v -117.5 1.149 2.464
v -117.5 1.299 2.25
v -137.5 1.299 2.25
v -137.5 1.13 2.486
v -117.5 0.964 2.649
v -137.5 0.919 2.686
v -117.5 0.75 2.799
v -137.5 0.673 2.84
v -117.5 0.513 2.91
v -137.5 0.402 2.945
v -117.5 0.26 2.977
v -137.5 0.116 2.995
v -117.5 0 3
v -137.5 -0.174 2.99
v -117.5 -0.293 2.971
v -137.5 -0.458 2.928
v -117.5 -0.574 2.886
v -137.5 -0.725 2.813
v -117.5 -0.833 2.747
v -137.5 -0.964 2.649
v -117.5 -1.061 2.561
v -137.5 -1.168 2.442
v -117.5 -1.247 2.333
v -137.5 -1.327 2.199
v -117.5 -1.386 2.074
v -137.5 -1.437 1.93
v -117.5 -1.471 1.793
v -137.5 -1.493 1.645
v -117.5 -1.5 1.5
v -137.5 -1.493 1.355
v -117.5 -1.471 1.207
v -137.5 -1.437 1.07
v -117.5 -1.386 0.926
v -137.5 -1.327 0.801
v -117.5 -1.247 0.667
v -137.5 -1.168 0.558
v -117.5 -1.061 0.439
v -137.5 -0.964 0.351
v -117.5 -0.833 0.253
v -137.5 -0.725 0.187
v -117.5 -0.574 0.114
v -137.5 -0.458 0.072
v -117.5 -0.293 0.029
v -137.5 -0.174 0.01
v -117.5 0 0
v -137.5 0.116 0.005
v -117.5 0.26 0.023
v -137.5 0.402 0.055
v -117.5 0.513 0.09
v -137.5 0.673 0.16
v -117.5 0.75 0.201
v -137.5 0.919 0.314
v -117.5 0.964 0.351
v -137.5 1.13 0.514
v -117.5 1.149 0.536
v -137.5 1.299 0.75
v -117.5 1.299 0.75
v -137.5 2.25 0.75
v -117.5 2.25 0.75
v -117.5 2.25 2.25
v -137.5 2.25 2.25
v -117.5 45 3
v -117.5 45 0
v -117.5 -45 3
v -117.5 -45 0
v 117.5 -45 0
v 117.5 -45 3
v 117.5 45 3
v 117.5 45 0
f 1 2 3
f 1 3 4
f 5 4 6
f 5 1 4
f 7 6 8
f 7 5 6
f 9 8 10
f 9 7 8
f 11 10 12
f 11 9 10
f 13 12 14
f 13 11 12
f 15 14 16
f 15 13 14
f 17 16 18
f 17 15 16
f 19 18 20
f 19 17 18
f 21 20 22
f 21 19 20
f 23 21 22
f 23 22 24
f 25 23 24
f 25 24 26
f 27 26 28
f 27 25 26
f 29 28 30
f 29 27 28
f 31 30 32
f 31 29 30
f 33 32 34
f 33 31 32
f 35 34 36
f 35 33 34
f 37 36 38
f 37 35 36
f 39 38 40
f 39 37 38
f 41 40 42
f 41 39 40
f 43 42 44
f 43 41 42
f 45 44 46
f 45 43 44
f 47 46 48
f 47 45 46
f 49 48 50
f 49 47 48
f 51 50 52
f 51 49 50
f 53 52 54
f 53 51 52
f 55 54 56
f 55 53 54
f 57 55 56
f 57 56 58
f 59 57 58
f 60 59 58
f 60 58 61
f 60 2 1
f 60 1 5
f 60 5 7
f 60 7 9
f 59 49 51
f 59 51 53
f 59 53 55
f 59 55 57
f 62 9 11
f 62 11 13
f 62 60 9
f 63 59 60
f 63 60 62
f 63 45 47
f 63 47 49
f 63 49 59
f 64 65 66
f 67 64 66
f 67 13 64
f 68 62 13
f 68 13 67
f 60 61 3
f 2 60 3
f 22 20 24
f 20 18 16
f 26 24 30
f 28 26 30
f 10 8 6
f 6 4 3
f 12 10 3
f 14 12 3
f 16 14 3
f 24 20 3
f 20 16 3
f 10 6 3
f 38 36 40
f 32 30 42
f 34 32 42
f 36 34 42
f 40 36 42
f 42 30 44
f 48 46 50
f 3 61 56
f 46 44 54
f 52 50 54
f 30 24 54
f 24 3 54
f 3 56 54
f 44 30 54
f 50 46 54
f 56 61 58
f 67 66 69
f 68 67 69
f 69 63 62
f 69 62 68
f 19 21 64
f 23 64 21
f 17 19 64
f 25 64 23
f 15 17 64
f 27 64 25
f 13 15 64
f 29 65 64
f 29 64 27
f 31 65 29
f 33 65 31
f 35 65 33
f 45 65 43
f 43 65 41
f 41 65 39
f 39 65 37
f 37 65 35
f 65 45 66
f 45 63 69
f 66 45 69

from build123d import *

# Parameters (mm, degrees)
SKETCH_1_W      = 235
SKETCH_1_H      = 90
EXTRUDE_1_DEPTH = 3
EXTRUDE_2_DEPTH = 20


with BuildPart() as part:
    # 草图1 → 凸台-拉伸1 (new body)
    with BuildSketch(Plane.XY):
        Rectangle(SKETCH_1_W, SKETCH_1_H)
    extrude(amount=EXTRUDE_1_DEPTH)

    # 草图2 → 凸台-拉伸2 (add)
    with BuildSketch(Plane.ZY.offset(117.5)):
        with BuildLine():
            Line((0.75, 2.25), (2.25, 2.25))
            Line((2.25, 2.25), (2.25, 1.299038106))
            ThreePointArc((2.25, 1.299038106), (1.5, -1.5), (0.75, 1.299038106))
            Line((0.75, 1.299038106), (0.75, 2.25))
        make_face()
    extrude(amount=EXTRUDE_2_DEPTH)


solid = part.part
